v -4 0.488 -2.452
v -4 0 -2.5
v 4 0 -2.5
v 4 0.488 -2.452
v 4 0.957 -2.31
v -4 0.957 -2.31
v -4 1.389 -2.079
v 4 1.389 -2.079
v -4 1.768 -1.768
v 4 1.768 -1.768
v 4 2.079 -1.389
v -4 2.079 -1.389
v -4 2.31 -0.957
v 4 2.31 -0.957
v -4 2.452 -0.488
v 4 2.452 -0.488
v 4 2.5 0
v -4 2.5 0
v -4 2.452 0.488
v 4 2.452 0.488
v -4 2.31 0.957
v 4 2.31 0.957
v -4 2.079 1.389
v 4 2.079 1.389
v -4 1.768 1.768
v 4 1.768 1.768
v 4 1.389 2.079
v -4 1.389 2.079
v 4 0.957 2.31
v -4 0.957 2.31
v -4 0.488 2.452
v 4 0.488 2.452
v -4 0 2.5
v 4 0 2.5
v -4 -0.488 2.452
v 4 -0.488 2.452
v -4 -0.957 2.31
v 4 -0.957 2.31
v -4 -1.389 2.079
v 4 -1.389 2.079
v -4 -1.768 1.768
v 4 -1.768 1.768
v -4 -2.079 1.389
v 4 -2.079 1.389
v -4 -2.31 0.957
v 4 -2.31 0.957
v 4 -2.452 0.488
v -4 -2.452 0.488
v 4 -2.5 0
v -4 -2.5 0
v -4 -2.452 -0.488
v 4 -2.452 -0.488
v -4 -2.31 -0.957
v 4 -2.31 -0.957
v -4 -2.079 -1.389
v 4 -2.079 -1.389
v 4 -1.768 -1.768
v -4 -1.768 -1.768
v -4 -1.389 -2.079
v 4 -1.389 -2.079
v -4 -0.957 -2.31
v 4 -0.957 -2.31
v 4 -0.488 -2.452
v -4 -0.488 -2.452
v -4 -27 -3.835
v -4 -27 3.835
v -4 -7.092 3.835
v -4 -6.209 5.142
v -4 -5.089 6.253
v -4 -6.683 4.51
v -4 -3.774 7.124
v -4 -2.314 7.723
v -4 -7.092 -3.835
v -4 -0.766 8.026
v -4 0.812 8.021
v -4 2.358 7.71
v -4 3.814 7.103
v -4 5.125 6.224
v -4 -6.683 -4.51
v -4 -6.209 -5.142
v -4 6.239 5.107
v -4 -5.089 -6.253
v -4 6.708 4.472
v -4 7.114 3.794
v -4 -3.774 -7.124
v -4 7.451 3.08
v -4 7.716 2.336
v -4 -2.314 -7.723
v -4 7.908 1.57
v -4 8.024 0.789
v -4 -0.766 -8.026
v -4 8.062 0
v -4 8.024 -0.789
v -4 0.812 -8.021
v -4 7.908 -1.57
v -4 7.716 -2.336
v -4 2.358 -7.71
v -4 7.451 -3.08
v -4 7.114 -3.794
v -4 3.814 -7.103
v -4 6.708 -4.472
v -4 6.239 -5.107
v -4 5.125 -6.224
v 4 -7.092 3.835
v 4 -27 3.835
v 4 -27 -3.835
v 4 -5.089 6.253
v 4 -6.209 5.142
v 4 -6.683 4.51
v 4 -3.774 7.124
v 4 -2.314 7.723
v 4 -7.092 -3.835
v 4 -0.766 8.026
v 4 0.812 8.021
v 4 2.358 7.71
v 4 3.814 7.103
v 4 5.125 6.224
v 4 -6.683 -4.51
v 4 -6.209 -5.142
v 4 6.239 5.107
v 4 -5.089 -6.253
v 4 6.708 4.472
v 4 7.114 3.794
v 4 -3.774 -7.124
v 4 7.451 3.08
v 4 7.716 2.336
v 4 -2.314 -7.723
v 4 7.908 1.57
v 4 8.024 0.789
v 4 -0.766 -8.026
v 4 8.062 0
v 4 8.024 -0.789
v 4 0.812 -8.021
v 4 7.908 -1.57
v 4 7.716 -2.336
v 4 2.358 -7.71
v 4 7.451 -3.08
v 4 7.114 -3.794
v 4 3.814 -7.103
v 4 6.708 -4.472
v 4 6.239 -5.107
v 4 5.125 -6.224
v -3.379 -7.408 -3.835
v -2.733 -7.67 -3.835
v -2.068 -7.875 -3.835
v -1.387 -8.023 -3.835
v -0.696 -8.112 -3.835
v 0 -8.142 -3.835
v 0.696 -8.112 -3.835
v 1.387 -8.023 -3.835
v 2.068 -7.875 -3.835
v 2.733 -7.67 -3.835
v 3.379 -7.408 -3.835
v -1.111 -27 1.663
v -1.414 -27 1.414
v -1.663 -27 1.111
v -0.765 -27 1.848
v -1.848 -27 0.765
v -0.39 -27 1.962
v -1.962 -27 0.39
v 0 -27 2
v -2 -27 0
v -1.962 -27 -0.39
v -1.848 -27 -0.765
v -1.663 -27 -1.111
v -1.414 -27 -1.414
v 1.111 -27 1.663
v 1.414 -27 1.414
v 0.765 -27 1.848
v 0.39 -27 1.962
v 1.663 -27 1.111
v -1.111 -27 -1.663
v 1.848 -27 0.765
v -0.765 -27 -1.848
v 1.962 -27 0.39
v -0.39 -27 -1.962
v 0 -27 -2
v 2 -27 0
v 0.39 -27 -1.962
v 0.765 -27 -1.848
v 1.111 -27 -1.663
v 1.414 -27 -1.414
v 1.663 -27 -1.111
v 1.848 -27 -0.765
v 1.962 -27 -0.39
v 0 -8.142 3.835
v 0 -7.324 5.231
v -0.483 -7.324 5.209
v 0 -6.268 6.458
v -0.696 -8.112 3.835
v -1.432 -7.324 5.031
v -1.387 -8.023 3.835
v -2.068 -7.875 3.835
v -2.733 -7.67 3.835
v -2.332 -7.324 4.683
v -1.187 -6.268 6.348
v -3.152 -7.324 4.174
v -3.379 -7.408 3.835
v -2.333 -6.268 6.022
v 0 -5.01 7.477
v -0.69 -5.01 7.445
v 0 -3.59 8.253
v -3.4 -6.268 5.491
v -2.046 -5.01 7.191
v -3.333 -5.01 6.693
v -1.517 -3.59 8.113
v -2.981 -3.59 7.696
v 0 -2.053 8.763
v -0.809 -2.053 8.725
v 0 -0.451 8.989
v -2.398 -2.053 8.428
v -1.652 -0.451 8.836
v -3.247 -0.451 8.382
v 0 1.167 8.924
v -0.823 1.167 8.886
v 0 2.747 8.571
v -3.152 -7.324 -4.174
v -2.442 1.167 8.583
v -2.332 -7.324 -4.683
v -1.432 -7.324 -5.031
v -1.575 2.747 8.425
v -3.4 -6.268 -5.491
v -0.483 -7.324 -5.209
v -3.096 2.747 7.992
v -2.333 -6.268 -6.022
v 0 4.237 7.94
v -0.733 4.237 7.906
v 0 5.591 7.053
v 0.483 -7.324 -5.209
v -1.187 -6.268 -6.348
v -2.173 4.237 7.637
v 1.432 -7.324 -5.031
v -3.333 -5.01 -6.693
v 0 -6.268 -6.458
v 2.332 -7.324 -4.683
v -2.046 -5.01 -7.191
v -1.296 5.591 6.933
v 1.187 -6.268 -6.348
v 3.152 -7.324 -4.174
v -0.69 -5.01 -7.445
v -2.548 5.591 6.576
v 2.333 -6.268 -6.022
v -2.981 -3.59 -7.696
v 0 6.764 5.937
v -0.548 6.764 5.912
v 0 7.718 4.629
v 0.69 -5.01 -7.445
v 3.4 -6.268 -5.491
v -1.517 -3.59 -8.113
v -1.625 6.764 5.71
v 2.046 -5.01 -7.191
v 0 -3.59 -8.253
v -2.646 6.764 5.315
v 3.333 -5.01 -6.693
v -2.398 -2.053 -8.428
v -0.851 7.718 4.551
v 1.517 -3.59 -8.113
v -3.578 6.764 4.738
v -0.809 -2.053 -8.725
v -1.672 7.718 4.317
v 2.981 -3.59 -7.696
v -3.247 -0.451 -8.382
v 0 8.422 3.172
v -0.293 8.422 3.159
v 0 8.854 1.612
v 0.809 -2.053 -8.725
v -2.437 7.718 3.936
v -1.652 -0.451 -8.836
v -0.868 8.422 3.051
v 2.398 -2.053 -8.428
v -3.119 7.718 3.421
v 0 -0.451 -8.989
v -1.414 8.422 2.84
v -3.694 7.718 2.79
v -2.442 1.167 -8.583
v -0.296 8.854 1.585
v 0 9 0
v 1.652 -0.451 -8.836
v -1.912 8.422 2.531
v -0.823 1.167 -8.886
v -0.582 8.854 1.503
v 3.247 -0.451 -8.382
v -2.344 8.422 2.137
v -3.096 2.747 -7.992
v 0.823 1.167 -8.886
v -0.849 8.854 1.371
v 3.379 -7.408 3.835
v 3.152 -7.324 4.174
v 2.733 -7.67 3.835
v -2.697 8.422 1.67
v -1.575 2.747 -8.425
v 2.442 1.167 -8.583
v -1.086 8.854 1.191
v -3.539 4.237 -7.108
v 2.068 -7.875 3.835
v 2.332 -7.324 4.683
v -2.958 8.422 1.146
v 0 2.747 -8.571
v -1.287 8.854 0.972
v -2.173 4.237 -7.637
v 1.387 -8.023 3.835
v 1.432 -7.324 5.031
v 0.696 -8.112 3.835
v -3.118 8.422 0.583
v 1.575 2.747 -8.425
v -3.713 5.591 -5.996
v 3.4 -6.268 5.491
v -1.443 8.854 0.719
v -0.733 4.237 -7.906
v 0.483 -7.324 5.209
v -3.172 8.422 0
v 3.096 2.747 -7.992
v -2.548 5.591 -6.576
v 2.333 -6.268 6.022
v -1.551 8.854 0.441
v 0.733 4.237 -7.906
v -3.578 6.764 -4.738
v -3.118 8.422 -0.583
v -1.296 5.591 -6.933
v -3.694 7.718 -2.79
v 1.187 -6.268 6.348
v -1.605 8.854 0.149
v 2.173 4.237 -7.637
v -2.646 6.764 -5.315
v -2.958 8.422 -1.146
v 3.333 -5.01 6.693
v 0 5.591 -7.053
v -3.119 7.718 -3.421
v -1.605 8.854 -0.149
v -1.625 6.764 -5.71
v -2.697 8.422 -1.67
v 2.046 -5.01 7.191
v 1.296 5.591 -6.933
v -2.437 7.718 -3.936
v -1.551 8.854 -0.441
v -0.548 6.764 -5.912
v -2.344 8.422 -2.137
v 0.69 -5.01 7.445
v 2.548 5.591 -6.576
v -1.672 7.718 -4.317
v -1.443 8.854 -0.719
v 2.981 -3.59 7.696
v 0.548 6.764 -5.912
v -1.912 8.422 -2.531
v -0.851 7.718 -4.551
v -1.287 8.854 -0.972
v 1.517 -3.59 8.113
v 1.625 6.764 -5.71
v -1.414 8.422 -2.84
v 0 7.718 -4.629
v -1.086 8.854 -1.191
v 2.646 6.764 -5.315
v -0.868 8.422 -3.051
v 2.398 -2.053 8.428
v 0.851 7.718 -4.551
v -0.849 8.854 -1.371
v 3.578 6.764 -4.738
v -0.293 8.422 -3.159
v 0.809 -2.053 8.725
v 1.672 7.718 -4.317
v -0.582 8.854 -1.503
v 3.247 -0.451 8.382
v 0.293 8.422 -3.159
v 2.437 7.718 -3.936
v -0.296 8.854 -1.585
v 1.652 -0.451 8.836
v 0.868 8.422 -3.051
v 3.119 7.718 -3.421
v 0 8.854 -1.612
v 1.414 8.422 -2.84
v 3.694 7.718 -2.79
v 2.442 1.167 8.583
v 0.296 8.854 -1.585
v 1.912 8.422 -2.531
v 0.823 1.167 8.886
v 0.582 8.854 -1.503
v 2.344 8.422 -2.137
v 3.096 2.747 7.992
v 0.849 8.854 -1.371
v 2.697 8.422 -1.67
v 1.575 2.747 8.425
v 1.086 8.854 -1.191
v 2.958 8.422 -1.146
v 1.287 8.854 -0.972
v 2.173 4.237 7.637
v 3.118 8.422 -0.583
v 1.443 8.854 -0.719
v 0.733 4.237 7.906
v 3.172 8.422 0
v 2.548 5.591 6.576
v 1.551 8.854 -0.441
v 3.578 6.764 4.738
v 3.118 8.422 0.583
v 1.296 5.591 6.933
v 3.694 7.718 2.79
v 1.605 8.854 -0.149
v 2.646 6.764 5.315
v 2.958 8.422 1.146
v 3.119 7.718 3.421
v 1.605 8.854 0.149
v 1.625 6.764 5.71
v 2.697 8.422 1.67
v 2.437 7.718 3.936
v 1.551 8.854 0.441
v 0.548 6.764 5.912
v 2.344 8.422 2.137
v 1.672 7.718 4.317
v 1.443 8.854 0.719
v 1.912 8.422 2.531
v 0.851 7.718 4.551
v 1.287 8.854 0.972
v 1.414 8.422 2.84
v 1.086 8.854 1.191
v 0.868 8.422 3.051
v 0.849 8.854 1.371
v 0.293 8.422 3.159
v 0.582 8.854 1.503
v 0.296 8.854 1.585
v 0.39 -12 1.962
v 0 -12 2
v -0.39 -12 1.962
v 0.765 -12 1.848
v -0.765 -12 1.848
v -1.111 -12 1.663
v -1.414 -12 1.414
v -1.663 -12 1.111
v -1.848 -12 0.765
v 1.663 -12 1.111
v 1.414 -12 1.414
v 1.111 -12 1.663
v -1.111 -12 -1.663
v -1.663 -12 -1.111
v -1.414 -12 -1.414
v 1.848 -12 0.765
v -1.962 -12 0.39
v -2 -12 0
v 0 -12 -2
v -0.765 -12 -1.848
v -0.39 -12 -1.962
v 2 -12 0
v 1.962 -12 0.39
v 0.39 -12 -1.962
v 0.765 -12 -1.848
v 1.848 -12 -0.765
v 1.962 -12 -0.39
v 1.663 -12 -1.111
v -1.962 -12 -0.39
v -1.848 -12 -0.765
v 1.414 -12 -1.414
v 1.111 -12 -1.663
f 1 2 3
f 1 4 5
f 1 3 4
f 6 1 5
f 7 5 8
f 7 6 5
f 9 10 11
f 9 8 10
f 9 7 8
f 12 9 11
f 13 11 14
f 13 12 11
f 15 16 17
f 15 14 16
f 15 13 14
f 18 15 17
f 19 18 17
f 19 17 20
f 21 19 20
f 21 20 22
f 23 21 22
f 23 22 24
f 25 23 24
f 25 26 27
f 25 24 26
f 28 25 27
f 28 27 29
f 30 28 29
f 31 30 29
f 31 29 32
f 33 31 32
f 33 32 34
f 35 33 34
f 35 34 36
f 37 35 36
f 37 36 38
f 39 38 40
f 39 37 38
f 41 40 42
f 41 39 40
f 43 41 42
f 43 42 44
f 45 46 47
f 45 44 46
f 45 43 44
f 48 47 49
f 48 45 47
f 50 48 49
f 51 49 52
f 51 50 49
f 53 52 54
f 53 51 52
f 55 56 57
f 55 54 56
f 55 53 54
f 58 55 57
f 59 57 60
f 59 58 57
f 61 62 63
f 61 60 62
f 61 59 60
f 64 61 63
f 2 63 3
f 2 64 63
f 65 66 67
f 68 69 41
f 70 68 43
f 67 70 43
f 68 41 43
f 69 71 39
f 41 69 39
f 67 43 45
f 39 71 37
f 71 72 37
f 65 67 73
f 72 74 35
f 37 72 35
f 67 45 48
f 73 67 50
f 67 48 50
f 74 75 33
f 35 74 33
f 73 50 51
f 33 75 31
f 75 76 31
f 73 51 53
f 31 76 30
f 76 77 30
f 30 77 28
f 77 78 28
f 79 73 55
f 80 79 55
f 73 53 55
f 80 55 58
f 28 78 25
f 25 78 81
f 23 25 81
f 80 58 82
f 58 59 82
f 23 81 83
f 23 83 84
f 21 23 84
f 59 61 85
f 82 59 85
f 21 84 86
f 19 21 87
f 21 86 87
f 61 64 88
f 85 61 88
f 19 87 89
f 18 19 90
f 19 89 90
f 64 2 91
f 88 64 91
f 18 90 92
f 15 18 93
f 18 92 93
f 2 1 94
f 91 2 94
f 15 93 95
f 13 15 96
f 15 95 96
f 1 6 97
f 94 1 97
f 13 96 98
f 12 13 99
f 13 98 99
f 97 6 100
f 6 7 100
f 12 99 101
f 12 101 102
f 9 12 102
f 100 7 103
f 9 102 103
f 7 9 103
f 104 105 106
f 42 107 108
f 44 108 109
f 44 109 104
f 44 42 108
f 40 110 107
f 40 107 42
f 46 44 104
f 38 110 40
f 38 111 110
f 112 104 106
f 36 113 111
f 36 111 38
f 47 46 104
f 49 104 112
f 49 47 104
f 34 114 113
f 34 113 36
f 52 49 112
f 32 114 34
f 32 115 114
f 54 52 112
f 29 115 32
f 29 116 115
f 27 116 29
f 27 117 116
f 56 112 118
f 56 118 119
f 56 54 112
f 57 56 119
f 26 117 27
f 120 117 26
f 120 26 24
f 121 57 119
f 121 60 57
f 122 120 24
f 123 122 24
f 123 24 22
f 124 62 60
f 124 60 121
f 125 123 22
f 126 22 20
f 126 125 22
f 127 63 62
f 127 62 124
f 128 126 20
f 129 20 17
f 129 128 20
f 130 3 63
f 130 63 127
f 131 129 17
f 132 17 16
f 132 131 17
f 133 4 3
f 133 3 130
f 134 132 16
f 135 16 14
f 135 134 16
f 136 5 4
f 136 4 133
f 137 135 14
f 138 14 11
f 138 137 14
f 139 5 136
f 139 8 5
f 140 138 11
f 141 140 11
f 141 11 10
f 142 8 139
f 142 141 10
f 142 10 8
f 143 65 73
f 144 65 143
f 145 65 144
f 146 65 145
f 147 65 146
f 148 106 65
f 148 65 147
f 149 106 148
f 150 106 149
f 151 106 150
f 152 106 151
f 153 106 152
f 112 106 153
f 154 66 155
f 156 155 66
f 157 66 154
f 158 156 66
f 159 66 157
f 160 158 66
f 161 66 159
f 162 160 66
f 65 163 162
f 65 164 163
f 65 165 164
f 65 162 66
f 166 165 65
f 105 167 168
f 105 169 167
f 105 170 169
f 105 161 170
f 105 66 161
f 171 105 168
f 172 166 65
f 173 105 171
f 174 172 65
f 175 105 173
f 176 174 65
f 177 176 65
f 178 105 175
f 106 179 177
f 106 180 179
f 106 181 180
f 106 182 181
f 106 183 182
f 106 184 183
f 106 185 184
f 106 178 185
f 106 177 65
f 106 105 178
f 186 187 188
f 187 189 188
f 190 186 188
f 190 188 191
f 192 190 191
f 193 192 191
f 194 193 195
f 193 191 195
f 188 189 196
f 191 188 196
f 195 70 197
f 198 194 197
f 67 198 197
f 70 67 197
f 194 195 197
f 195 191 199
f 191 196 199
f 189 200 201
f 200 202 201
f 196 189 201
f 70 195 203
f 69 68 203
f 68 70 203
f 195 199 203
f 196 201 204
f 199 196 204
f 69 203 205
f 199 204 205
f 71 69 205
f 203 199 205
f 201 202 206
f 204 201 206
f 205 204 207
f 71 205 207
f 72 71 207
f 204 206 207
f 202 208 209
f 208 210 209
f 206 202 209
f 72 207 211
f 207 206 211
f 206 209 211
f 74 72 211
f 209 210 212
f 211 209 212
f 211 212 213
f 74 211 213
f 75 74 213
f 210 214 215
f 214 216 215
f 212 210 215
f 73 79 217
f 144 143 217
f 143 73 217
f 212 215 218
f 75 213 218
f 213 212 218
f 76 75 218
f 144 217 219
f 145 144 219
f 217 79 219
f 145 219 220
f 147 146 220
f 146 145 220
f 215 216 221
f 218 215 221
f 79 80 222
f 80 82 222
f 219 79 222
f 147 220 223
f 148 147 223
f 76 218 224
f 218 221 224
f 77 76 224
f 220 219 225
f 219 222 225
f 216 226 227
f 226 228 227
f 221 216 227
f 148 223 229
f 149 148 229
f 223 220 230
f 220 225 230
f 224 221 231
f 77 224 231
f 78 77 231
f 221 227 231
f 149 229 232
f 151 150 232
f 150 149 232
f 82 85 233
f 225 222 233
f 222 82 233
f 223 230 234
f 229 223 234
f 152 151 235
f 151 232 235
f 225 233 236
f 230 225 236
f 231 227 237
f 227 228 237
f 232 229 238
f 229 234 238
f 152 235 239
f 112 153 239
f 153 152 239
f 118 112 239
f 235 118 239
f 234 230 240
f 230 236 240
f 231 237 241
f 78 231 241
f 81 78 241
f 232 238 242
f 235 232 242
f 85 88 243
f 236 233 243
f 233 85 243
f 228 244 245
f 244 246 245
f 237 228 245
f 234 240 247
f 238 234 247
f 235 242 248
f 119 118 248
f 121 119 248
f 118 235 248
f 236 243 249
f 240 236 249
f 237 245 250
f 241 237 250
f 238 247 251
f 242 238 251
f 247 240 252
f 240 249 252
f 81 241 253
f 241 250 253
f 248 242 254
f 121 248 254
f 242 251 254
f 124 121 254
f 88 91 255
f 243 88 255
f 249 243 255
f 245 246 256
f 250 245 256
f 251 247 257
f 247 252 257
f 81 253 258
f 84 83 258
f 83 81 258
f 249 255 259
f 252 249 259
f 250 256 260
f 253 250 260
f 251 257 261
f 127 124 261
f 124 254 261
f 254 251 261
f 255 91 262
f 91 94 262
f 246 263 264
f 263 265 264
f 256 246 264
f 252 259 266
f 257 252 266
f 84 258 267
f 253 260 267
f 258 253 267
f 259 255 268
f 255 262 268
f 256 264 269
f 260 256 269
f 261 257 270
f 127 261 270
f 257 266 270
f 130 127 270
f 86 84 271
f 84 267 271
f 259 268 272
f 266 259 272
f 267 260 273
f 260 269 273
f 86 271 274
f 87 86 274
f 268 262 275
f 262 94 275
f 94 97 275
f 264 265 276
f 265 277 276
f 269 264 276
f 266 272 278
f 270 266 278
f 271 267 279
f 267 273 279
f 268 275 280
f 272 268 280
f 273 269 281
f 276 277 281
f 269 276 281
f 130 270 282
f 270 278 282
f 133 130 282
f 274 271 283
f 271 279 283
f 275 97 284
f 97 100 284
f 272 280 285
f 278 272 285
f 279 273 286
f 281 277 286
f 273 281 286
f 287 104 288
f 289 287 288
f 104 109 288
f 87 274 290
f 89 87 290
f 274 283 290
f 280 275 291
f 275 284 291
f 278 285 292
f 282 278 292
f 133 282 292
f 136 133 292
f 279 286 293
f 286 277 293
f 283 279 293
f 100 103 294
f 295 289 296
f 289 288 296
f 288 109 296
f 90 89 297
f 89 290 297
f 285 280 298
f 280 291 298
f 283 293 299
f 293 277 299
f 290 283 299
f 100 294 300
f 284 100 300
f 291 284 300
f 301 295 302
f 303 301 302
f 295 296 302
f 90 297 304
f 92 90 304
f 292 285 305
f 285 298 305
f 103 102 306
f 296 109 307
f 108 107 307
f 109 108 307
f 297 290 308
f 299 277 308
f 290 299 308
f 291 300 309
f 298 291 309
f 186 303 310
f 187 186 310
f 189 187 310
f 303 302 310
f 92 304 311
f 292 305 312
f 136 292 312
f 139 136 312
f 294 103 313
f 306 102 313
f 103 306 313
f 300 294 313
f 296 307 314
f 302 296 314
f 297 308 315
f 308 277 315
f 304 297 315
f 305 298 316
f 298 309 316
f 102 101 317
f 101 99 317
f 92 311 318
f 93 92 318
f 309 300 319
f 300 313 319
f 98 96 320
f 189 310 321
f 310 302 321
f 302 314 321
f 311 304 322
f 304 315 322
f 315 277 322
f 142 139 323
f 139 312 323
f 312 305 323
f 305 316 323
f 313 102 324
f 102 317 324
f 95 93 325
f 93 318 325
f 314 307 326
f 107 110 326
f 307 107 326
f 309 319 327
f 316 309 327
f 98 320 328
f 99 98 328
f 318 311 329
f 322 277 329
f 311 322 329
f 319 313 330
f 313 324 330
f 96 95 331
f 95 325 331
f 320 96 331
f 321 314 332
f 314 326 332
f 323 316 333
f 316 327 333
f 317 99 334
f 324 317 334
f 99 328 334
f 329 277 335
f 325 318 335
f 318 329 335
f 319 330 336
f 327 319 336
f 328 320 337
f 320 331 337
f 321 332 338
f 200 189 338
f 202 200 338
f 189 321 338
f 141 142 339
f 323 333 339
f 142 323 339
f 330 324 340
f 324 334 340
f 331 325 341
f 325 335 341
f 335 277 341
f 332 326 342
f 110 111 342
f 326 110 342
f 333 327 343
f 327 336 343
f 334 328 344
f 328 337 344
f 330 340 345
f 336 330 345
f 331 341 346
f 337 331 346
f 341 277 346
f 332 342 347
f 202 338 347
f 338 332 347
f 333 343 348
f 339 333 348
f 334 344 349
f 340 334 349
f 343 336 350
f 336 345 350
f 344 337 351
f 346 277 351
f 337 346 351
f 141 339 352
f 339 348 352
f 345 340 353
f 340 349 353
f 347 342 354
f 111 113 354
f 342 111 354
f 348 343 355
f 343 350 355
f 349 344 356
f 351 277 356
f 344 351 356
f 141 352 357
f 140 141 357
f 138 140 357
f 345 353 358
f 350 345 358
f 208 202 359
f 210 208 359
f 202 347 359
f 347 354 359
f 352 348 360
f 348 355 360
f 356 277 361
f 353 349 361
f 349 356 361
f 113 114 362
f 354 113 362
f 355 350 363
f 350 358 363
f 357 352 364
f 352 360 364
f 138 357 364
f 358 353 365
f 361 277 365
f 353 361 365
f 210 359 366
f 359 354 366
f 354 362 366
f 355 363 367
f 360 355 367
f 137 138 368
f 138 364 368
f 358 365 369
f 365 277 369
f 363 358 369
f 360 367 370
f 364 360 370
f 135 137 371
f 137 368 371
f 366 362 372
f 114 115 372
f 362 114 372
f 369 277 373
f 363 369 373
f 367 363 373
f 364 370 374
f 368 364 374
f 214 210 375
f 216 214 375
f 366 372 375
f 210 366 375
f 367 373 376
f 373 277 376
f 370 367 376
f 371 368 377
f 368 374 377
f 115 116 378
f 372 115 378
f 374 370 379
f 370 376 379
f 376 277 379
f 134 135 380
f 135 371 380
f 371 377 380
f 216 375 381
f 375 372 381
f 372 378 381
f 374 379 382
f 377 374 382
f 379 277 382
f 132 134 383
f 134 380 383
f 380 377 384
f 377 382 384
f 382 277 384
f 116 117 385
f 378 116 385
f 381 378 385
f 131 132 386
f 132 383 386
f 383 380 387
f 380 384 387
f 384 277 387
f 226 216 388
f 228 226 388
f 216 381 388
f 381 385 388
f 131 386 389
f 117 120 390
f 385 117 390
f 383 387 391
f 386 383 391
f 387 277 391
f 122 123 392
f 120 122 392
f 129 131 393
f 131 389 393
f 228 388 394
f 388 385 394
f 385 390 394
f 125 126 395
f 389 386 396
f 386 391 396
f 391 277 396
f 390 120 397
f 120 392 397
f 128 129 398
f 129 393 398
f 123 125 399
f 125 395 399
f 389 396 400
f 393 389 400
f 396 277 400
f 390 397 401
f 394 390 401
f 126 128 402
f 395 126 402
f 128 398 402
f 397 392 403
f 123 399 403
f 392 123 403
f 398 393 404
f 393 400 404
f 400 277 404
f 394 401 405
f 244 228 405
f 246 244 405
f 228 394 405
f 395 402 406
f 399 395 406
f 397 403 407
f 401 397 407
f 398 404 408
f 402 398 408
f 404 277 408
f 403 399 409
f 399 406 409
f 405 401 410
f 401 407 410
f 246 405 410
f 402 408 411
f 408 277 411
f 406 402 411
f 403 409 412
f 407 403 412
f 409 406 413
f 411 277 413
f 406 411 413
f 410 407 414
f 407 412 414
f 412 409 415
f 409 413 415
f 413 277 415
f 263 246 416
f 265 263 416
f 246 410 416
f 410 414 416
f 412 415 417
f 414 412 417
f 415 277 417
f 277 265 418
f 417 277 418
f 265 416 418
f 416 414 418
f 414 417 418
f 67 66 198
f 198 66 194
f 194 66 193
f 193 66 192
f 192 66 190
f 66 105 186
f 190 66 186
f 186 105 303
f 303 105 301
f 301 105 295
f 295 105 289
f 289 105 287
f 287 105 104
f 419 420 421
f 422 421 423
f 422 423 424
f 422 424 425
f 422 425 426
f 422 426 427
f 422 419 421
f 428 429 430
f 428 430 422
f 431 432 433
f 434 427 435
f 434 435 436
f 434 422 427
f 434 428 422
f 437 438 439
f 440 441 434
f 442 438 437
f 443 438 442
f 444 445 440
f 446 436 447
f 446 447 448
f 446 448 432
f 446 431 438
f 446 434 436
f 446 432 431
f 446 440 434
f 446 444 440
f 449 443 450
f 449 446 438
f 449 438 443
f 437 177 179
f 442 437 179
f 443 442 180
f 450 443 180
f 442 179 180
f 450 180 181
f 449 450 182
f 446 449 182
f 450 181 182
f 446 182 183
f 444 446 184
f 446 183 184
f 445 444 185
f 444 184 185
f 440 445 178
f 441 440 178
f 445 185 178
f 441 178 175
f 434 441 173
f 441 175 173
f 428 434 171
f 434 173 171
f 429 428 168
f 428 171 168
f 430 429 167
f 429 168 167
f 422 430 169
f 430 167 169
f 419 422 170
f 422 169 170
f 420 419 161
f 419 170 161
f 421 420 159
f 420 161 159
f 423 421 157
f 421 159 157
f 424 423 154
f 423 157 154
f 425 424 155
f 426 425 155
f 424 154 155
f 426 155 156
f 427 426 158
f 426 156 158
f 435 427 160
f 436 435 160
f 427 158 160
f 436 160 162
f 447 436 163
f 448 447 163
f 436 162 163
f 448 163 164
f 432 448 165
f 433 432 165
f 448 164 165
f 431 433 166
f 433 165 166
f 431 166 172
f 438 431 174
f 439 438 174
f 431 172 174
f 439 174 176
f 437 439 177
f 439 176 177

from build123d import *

# Parameters (mm, degrees)
CUT_EXTRUDE_START        = -9
CUT_EXTRUDE_1_OUTLINE_W  = 6
CUT_EXTRUDE_1_OUTLINE_H  = 20
CUT_EXTRUDE_1_DEPTH      = 18
CUT_EXTRUDE_2_DEPTH      = 19.193405399
CUT_EXTRUDE_2_DEPTH_BACK = 19.193405399
SKETCH_3_R               = 2.5
SKETCH_4_W               = 7.669123848
SKETCH_4_H               = 20.676781993
EXTRUDE_1_DEPTH          = 8
SKETCH_5_R               = 2
CUT_EXTRUDE_3_DEPTH      = 15


with BuildPart() as part:
    # 草图1 → 旋转1 (revolve)
    with BuildSketch(Plane(origin=(0, 0, 0), x_dir=(0, 0, -1), z_dir=(1, 0, 0))):
        with BuildLine():
            Line((0, 9), (0, -9))
            ThreePointArc((0, -9), (-9, 0), (0, 9))
        make_face()
    revolve(axis=Axis((0, 9, 0), (0, -1, 0)))

    # 切除-拉伸1: read off the stored shape, not the designer's step
    # 切除-拉伸1 outline → 切除-拉伸1 (cut)
    with BuildSketch(Plane.XY.offset(CUT_EXTRUDE_START)):
        with Locations((-7, 0)):
            Rectangle(CUT_EXTRUDE_1_OUTLINE_W, CUT_EXTRUDE_1_OUTLINE_H)
        with Locations((7, 0)):
            Rectangle(CUT_EXTRUDE_1_OUTLINE_W, CUT_EXTRUDE_1_OUTLINE_H)
    extrude(amount=CUT_EXTRUDE_1_DEPTH, mode=Mode.SUBTRACT)

    # 草图3 → 切除-拉伸2 (cut, two sides: drawn at the far end of the back side and taken through both)
    with BuildSketch(Plane(origin=(4, 0, 0), x_dir=(0, 0, -1), z_dir=(1, 0, 0)).offset(-CUT_EXTRUDE_2_DEPTH_BACK)):
        Circle(SKETCH_3_R)
    extrude(amount=CUT_EXTRUDE_2_DEPTH + CUT_EXTRUDE_2_DEPTH_BACK, mode=Mode.SUBTRACT)

    # 草图4 → 凸台-拉伸1 (add)
    with BuildSketch(Plane(origin=(4, 0, 0), x_dir=(0, 0, -1), z_dir=(1, 0, 0))):
        with Locations((0, -16.661609004)):
            Rectangle(SKETCH_4_W, SKETCH_4_H)
    extrude(amount=-EXTRUDE_1_DEPTH)

    # 草图5 → 切除-拉伸3 (cut)
    with BuildSketch(Plane.XZ.offset(27)):
        with Locations(Location((0, 0, 0), (0, 0, 270))):
            Circle(SKETCH_5_R)
    extrude(amount=-CUT_EXTRUDE_3_DEPTH, mode=Mode.SUBTRACT)


solid = part.part
